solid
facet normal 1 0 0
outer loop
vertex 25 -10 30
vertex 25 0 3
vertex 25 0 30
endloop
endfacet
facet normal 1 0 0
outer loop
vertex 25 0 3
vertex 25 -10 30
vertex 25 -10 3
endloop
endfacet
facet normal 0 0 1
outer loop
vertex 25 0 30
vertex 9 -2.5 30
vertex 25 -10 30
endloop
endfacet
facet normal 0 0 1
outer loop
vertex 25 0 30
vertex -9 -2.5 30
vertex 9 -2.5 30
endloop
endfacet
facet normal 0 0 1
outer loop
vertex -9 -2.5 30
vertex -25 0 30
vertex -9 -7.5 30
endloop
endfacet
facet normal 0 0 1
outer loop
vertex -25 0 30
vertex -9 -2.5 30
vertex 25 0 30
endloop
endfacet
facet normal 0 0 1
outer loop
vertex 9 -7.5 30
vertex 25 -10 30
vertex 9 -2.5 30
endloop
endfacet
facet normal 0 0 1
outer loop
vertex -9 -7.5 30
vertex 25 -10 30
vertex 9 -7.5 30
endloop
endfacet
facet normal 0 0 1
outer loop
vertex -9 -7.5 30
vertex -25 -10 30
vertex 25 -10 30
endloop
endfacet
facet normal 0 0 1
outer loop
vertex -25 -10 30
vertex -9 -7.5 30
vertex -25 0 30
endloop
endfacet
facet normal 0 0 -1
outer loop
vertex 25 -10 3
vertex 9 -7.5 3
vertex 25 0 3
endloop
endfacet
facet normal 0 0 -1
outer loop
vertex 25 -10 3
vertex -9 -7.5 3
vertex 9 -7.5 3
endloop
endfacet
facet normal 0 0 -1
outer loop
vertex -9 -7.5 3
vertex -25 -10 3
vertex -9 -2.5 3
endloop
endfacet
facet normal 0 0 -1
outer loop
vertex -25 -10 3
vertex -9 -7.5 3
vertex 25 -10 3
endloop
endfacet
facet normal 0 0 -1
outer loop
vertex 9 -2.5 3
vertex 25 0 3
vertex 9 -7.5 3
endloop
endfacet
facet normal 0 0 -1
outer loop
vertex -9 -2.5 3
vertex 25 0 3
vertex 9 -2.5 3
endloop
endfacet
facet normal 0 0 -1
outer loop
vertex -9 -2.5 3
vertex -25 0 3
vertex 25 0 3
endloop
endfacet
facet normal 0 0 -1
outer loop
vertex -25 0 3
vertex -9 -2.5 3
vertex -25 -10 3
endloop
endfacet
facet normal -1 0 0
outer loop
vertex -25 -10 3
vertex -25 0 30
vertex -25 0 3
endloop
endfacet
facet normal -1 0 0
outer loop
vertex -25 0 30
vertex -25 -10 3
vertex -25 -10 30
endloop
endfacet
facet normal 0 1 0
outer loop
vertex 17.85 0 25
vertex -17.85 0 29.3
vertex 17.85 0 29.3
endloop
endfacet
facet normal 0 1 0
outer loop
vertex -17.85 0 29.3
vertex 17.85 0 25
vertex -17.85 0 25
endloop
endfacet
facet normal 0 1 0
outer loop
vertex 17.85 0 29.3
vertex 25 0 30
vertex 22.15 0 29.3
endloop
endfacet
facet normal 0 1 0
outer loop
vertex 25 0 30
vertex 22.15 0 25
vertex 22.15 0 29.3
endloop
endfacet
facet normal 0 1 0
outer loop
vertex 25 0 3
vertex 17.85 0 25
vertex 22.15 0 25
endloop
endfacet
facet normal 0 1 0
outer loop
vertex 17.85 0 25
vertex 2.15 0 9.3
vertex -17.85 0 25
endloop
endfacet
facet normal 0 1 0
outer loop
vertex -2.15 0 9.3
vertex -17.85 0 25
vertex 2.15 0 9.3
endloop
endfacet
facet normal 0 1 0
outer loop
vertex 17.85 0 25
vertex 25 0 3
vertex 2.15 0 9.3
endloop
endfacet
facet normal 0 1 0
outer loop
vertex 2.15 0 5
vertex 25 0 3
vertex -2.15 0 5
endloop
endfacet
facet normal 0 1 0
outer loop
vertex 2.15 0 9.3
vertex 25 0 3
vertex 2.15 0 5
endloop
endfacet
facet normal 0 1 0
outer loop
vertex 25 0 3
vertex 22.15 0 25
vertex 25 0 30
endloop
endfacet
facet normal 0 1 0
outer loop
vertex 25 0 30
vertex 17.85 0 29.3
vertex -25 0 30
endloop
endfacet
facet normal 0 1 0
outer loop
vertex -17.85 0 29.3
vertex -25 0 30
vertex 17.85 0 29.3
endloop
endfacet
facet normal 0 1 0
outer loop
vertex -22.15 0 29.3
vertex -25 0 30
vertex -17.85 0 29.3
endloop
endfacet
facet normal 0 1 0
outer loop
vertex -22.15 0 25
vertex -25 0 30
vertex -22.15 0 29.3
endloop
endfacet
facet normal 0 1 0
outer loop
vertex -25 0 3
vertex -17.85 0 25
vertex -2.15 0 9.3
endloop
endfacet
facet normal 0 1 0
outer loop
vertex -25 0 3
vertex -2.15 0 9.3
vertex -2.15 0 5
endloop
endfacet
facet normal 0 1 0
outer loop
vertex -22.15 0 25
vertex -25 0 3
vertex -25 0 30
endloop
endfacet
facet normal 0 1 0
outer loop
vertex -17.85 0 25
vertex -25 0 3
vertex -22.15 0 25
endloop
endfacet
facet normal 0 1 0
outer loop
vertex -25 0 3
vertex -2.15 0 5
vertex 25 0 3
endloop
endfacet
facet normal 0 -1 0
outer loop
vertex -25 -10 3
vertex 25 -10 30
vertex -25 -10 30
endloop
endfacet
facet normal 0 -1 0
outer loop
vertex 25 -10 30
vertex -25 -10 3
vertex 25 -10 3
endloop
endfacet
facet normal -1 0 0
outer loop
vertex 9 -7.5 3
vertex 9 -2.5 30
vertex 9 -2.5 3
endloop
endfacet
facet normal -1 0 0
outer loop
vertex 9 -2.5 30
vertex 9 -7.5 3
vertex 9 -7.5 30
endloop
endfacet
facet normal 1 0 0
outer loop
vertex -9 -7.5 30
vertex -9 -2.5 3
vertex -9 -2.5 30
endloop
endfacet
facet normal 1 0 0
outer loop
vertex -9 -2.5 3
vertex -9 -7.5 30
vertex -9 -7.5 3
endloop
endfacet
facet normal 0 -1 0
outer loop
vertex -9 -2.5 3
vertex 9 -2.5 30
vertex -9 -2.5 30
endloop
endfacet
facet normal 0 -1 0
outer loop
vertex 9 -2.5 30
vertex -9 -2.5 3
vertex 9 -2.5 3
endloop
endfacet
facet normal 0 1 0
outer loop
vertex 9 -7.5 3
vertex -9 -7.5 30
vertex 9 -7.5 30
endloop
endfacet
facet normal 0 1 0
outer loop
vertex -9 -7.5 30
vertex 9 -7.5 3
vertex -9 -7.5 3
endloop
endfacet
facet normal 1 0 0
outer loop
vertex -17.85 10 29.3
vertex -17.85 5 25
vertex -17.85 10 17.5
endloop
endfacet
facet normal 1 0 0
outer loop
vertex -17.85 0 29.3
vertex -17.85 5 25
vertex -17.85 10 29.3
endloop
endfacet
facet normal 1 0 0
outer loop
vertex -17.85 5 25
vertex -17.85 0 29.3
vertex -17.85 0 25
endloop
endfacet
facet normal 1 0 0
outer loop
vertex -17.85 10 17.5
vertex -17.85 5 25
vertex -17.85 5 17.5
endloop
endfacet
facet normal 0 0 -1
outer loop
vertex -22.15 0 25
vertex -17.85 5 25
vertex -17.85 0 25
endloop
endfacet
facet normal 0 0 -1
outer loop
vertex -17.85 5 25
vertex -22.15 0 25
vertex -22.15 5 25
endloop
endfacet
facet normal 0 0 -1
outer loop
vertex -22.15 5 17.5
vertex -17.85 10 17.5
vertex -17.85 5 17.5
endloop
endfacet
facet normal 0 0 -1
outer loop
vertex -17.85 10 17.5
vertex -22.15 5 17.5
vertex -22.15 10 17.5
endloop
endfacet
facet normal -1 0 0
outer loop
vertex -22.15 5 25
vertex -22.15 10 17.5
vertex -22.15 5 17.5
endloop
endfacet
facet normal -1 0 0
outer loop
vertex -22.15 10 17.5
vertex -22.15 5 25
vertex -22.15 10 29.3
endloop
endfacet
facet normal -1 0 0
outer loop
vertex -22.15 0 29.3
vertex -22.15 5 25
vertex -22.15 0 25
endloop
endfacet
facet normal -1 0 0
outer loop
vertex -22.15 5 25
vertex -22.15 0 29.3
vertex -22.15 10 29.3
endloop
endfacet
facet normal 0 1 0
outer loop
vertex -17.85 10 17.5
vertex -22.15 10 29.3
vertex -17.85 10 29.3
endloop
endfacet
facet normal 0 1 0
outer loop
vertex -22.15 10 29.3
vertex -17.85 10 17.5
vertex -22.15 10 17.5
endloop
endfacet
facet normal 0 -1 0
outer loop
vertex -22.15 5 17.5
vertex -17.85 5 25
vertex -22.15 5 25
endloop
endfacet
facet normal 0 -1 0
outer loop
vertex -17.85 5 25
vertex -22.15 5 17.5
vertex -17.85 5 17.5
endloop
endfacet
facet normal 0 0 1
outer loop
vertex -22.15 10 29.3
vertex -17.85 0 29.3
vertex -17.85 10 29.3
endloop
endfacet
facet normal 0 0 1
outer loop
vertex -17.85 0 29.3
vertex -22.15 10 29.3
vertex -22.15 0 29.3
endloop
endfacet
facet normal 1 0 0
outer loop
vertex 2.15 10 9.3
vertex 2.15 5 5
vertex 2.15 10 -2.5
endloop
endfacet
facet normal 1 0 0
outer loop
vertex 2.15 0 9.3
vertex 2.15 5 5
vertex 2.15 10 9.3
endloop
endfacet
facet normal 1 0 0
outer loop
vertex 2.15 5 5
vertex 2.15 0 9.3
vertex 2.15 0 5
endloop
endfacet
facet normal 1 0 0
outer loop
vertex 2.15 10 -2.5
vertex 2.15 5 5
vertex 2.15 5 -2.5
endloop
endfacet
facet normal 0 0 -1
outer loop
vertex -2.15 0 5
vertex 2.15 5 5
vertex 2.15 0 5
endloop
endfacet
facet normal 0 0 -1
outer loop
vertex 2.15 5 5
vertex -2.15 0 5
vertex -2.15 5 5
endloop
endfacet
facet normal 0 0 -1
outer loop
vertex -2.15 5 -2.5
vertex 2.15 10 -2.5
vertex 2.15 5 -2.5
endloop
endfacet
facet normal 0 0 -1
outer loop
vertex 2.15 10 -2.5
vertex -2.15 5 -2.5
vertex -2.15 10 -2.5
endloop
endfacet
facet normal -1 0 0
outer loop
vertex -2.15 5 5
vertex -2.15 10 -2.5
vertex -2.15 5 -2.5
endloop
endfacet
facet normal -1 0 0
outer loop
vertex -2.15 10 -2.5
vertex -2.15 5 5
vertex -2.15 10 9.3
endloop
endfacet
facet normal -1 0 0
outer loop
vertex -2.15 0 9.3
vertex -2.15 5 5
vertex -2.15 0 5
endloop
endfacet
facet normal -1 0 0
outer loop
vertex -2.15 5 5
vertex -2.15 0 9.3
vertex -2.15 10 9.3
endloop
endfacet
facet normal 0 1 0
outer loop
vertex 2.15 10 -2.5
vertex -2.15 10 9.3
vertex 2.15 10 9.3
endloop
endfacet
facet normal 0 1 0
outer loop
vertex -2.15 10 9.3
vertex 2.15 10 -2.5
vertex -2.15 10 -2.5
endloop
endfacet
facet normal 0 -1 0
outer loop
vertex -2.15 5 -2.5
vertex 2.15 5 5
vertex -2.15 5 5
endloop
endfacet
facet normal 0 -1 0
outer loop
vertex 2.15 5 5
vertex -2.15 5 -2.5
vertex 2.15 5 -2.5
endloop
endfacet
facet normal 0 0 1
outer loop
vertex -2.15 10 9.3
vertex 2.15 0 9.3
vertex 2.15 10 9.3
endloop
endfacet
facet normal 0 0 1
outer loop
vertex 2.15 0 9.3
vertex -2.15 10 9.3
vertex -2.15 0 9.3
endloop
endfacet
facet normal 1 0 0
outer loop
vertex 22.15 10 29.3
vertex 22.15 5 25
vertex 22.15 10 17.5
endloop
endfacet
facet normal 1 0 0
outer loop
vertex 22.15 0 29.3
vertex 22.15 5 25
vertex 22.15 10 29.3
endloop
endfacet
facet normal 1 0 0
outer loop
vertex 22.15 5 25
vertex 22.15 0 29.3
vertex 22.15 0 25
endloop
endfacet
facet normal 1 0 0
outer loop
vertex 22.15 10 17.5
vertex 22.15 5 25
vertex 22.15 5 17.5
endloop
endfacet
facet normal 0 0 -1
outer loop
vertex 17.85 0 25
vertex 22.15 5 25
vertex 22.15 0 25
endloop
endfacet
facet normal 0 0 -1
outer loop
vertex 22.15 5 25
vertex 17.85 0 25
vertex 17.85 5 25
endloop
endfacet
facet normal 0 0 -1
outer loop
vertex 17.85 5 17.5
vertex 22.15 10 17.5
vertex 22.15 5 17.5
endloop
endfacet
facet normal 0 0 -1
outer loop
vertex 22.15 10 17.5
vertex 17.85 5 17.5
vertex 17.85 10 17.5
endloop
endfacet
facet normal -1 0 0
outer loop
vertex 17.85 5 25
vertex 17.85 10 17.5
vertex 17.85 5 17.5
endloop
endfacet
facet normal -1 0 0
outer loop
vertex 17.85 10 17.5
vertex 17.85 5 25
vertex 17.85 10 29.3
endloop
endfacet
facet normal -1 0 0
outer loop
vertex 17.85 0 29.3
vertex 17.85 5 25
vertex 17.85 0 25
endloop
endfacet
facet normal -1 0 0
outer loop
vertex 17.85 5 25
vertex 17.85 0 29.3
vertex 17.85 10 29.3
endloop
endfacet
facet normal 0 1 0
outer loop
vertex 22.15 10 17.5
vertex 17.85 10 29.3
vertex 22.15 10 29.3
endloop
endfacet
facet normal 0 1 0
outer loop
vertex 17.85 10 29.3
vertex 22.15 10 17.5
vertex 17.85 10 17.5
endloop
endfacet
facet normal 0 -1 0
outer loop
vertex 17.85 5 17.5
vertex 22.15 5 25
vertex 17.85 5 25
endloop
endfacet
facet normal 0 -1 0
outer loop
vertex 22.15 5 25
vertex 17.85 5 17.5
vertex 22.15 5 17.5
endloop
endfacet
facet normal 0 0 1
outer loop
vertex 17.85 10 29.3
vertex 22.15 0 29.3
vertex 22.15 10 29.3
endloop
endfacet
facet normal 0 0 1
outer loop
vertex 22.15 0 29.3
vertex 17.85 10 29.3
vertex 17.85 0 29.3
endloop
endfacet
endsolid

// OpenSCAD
// file: ../../modules/skadis.scad
ikea_skadis_hole_w = 4.3;
ikea_skadis_hook_depth = 5;
ikea_skadis_hole_h = 7.5;
ikea_skadis_holes_dist = 80;
ikea_skadis_holes_horiz_dist = 40;

module skadis_hook() {
    color("green")
    translate([0,ikea_skadis_hook_depth,-ikea_skadis_hole_h]) cube([ikea_skadis_hole_w,ikea_skadis_hook_depth,ikea_skadis_hole_h ]);

    color("violet")
    translate([0,0,0]) cube([ikea_skadis_hole_w,ikea_skadis_hook_depth*2,ikea_skadis_hole_w ]);
}

module skadis_double_hooks() {
    skadis_hook();
    
    translate([0,0,ikea_skadis_holes_dist]) skadis_hook();
    
    color("yellow")
    translate([0,-ikea_skadis_hook_depth,0])
    cube([ikea_skadis_hole_w,ikea_skadis_hook_depth,ikea_skadis_holes_dist + ikea_skadis_hole_w]);
}

module skadis_triple_horiz_hooks() {
    translate([-20 - ikea_skadis_hole_w / 2,0,0]) union() {
        skadis_hook();
        translate([20,0,-20]) skadis_hook();
        translate([40,0,0]) skadis_hook();
    }
}

//skadis_double_hooks();
//skadis_triple_horiz_hooks();
// main file
include <../../modules/skadis.scad>;


difference() {
    translate([-50/2,-10,3]) cube([50,10,27]);
    translate([-18/2,-5 - 2.5,-1]) cube([18,5,35]);
}

translate([0,0,25]) skadis_triple_horiz_hooks();
